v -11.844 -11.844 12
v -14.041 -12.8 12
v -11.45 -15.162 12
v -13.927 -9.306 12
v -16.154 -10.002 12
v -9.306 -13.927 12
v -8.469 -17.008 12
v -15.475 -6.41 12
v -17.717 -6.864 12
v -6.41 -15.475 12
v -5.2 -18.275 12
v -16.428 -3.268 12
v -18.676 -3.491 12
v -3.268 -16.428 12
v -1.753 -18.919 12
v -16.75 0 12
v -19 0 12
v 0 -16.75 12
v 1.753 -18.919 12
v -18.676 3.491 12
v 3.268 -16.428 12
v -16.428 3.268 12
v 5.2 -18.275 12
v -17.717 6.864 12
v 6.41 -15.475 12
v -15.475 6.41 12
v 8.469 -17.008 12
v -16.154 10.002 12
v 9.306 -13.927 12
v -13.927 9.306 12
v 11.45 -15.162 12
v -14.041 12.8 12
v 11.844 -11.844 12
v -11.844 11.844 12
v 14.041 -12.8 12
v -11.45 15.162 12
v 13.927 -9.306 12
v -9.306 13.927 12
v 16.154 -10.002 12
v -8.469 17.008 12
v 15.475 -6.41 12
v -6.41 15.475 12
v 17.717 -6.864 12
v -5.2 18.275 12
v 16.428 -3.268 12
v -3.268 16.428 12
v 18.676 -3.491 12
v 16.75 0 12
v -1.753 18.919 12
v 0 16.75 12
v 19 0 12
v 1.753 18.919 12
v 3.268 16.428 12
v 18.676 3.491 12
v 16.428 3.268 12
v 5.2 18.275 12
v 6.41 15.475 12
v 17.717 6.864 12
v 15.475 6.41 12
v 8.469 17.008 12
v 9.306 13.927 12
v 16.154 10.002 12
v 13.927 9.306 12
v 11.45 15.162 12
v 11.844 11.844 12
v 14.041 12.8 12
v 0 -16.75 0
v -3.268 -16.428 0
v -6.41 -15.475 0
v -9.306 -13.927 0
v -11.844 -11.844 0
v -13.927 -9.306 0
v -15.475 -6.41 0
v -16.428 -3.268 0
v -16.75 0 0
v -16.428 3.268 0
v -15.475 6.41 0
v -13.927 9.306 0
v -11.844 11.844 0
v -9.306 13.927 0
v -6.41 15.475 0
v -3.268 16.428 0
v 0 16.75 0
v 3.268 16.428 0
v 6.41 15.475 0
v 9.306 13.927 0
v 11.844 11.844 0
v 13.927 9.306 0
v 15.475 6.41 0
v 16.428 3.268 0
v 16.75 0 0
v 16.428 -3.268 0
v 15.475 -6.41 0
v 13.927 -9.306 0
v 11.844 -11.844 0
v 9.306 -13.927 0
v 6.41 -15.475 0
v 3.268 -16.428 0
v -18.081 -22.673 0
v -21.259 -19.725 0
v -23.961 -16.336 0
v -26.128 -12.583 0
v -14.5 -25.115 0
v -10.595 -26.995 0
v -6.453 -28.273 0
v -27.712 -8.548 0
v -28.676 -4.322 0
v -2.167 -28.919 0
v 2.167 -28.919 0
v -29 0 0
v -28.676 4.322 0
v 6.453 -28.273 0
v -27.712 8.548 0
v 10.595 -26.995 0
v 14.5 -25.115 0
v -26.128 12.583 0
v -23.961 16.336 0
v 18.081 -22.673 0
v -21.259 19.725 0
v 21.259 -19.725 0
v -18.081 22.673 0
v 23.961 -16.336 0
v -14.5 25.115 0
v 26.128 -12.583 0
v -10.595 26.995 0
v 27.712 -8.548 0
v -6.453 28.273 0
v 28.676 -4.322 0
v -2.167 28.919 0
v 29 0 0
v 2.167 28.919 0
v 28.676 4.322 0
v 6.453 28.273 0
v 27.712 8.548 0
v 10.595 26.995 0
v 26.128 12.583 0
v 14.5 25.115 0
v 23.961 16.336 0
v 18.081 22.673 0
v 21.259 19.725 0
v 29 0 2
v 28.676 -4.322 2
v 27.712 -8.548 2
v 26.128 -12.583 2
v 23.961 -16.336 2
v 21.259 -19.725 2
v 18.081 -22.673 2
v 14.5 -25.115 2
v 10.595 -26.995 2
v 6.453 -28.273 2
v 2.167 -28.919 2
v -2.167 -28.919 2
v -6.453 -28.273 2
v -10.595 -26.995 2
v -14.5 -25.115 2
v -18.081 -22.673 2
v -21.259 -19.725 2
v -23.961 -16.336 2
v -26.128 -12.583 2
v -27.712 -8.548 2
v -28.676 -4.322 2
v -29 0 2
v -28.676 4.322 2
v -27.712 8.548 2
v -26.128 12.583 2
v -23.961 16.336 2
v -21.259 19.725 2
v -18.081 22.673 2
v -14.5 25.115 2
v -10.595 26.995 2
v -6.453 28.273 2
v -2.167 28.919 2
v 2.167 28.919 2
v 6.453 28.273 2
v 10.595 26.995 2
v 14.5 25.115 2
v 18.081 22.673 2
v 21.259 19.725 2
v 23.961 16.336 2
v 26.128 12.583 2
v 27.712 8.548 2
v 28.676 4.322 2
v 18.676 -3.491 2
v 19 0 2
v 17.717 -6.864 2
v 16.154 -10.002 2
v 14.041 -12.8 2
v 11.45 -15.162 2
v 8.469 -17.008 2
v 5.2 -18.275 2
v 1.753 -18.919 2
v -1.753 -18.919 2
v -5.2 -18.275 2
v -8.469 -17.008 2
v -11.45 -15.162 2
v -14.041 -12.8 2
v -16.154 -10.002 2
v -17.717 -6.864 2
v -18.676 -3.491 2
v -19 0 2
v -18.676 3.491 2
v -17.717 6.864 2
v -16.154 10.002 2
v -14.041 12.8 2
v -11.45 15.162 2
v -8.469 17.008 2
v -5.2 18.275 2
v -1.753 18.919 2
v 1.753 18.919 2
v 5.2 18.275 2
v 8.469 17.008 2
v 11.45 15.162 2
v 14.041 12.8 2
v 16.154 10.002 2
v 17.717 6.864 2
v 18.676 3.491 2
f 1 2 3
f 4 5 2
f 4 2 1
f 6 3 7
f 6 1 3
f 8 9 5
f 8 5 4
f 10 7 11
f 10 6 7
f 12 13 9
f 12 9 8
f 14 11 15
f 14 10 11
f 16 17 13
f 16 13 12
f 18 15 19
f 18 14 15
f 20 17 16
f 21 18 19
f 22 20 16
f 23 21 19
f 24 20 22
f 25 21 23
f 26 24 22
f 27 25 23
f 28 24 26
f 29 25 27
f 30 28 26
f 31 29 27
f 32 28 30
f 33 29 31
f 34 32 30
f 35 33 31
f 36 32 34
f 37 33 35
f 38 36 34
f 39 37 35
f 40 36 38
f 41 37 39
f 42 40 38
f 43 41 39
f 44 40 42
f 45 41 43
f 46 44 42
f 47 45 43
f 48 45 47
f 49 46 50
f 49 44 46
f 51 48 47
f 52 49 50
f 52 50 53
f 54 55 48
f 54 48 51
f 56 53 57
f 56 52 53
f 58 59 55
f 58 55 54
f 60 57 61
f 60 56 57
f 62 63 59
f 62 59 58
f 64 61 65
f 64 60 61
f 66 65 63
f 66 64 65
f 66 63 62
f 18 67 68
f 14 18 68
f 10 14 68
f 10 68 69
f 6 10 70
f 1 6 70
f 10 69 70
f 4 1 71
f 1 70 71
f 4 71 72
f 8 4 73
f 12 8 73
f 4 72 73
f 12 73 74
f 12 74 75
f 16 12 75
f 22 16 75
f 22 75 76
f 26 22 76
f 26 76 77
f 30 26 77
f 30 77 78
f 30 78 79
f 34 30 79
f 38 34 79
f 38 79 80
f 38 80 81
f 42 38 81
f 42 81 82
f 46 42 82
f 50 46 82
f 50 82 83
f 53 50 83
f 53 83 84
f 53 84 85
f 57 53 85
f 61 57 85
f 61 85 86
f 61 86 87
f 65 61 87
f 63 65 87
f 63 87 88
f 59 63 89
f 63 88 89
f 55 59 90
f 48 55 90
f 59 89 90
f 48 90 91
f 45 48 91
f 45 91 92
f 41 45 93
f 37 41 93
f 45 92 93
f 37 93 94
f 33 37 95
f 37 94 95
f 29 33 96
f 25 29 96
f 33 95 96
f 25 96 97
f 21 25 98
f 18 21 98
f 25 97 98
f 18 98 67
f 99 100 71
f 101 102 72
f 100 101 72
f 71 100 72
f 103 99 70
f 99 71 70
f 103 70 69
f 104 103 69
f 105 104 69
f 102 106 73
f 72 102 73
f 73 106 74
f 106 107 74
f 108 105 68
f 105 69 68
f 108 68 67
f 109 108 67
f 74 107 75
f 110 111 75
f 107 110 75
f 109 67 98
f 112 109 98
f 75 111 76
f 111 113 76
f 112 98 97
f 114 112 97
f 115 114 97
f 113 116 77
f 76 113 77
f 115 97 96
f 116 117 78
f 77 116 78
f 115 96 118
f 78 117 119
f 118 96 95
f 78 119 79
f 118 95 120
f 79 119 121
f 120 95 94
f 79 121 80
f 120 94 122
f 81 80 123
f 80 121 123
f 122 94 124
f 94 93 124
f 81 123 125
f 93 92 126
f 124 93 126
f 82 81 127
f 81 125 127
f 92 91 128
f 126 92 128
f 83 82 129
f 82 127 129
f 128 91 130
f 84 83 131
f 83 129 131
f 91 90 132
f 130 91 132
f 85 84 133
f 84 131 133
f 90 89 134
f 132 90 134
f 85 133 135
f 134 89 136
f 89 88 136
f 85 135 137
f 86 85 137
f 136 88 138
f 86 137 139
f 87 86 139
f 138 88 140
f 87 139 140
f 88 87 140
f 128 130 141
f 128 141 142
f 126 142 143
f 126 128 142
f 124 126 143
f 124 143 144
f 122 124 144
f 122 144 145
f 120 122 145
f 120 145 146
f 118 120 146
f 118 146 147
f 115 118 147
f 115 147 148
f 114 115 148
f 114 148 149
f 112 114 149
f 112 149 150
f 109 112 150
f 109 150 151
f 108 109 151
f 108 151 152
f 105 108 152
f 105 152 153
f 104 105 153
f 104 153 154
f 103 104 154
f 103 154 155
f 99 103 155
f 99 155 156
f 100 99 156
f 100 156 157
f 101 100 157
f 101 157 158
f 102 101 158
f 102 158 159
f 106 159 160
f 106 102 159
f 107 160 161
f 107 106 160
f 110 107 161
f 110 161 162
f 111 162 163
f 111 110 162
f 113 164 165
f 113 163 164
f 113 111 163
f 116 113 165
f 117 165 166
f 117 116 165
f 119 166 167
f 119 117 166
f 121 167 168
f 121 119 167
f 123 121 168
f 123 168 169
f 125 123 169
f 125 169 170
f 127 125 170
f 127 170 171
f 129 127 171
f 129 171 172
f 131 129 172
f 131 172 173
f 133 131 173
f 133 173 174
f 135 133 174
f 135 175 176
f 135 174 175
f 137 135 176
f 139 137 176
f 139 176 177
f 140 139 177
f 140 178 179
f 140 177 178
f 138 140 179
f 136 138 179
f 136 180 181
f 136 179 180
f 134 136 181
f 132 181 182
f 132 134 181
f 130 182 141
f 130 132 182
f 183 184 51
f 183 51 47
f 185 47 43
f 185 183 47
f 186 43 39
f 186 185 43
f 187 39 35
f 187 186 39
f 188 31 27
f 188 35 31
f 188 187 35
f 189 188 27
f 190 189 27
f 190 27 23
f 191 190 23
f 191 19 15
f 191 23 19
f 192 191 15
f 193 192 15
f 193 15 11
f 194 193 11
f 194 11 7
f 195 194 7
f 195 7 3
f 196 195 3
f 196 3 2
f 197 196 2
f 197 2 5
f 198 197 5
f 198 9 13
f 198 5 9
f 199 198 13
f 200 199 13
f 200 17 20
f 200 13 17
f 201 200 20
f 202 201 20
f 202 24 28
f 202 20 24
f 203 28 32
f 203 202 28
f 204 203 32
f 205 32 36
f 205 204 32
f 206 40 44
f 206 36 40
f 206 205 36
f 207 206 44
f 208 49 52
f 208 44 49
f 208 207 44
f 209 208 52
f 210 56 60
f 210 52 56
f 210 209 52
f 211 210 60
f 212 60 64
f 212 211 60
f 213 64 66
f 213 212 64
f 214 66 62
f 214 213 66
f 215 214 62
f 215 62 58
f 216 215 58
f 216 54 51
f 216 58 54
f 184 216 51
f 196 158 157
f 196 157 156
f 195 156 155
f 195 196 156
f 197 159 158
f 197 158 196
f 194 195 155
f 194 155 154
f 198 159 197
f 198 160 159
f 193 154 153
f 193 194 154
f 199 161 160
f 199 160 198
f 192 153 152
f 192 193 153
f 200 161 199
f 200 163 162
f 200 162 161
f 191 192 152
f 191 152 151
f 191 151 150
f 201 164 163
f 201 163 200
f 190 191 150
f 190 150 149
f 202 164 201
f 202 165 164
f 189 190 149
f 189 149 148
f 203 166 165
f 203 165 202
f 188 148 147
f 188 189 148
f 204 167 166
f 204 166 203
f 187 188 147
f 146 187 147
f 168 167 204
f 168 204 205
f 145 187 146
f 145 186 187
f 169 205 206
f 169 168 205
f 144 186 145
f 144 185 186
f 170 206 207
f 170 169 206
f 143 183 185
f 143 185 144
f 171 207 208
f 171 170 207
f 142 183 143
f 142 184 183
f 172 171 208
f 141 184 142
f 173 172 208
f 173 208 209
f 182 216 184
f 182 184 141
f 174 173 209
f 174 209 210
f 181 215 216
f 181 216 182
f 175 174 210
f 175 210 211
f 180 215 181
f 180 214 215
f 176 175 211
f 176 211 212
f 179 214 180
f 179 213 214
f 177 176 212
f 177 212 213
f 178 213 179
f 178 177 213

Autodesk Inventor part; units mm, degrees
ref_plane "YZ Plane" through (0, 0, 0) normal (1, 0, 0) x (0, 1, 0)
ref_plane "XZ Plane" through (0, 0, 0) normal (0, 1, 0) x (-1, 0, 0)
ref_plane "XY Plane" through (0, 0, 0) normal (0, 0, 1) x (1, 0, 0)
sketch "Sketch1" plane through (0, 0, 0) normal (0, 0, 1) x (1, 0, 0)
  circle A0 centre (0, 0) radius 29
  dimension "d1" = 58
extrude "Extrusion1" add sketch "Sketch1" along normal blind 2
sketch "Sketch3" plane through (0, 0, 2) normal (0, 0, 1) x (1, 0, 0)
  circle A0 centre (0, 0) radius 19
  dimension "d11" = 38
extrude "Extrusion2" add sketch "Sketch3" along normal blind 10
sketch "Sketch4" plane through (0, 0, 12) normal (0, 0, 1) x (1, 0, 0)
  point P0 (0, 0)
  point P1 (0, 0)
hole "Hole2" at (0, 0, 12) direction (0, 0, -1) diameter 33.5 depth 12 tip angle 118
properties part number "xiq_camera_holder"
